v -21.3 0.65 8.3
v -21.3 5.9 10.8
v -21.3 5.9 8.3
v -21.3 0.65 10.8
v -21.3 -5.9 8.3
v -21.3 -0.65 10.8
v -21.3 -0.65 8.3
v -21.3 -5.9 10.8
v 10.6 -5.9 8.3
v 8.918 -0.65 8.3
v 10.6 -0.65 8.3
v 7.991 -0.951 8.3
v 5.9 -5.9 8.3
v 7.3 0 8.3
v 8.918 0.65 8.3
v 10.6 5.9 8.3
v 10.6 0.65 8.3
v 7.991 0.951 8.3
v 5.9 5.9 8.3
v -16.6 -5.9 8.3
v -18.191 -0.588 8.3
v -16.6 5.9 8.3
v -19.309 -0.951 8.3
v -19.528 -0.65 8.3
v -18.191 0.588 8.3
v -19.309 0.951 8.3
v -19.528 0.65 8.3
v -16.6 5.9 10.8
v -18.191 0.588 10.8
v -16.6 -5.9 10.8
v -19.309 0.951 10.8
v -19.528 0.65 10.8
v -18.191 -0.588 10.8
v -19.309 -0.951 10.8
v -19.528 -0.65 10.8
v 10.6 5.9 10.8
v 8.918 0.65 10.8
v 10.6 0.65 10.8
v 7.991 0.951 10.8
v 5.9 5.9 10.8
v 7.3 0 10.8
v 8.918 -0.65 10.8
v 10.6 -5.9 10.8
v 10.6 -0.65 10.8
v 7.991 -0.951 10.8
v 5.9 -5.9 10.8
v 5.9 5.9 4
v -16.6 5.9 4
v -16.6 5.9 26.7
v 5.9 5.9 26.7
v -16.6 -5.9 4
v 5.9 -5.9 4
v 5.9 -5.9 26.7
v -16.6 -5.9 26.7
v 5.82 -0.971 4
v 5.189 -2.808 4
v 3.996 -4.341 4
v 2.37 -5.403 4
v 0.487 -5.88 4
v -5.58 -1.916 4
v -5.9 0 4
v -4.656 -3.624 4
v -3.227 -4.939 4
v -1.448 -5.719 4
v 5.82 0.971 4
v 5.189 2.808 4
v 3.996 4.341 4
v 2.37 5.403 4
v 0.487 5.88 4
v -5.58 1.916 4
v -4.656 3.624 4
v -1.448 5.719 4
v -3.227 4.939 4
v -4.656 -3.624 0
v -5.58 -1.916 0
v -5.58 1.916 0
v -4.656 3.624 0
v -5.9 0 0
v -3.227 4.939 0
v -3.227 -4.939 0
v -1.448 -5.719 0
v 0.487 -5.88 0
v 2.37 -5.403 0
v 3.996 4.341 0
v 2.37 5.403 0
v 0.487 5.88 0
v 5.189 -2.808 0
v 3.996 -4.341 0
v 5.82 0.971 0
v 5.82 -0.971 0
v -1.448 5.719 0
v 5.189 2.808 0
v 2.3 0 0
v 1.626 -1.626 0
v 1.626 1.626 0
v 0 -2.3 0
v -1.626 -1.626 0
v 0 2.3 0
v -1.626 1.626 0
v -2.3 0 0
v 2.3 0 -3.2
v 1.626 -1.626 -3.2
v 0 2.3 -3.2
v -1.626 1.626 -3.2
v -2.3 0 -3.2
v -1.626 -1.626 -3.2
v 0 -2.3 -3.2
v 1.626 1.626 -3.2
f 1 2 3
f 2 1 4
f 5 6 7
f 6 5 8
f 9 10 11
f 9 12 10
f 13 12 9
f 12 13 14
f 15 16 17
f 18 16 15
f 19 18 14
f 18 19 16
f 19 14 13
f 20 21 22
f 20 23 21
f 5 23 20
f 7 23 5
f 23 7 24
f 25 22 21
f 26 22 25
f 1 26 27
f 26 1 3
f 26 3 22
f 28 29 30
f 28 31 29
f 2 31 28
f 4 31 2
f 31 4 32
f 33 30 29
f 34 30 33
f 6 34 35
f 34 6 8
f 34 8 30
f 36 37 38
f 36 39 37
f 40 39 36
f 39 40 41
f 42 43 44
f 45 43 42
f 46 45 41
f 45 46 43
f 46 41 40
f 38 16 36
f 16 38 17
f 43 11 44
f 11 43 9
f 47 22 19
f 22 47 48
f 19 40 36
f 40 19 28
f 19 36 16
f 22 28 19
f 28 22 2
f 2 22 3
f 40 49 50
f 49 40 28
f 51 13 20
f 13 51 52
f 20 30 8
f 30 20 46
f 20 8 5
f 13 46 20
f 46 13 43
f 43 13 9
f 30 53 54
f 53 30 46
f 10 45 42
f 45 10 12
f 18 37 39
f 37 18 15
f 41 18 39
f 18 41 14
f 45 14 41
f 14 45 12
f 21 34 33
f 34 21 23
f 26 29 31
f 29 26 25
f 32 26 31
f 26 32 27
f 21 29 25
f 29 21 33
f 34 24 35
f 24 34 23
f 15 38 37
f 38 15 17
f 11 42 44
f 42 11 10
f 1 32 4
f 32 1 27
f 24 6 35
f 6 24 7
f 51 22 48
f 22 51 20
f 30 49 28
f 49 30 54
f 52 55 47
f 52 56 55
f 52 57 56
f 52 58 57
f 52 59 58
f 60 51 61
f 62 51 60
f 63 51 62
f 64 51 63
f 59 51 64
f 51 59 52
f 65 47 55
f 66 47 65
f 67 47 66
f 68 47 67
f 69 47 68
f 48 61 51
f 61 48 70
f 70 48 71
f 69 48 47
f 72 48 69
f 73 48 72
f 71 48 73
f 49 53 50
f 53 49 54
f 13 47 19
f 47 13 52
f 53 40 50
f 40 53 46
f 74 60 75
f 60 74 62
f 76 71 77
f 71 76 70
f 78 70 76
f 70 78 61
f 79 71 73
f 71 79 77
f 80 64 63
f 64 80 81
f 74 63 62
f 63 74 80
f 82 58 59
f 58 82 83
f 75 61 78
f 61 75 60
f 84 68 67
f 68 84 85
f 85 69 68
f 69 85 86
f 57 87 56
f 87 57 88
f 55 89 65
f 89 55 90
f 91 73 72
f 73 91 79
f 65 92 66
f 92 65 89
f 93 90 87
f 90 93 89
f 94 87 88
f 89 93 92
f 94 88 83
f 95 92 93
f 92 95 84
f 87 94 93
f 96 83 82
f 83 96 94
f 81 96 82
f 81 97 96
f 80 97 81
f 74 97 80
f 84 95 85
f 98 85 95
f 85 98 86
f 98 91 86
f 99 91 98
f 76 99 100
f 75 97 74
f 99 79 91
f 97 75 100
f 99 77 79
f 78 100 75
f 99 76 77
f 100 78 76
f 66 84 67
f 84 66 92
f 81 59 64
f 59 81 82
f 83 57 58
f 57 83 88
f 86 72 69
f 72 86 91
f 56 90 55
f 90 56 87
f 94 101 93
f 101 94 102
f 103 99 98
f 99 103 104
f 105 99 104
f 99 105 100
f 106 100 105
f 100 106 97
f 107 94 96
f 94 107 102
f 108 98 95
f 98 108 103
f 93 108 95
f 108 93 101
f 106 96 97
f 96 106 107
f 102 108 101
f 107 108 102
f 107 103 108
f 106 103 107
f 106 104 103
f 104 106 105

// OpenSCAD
servo_sg90();

module servo_sg90()
{
    width = 22.5;
    length = 11.8;
    height = 22.7;
    
    mounting_width = width + (2 * 4.7);
    mounting_length = length;
    mounting_height = 2.5;
    mounting_width_offset = -4.7;
    mounting_height_offset = 18.4 - mounting_height;
    
    mounting_hole_diameter = 2;
    mounting_hole_width_offset = 2.3;
    mounting_hole_length_offset = 5.9;
    
    mounting_notch_width = mounting_hole_width_offset;
    mounting_notch_length = 1.3;
    mounting_notch_width_offset = mounting_notch_width / 2;
    
    mount_point_height = 4;
    mount_point_diameter = 11.8;
    mount_point_width_offset = 5.9;
    mount_point_length_offset = length / 2;
    mount_point_height_offset = height;
    
    gear_height = 3.2;
    gear_diameter = 4.6;
    gear_width_offset = mount_point_width_offset;
    gear_length_offset = mount_point_length_offset;
    gear_height_offset = mount_point_height_offset + mount_point_height;
    
    rotate([0, 180, 0])
    translate([-(gear_width_offset), -(gear_length_offset), -(height + mount_point_height)])
    union()
    {
        color("blue", 1.0)
        cube([width, length, height], false);
        
        color("blue", 1.0)
        translate([mounting_width_offset, 0, mounting_height_offset])
        difference()
        {
            cube([mounting_width, mounting_length, mounting_height], false);
            
            translate([mounting_hole_width_offset, mounting_hole_length_offset, 0])
            cylinder(height, d = mounting_hole_diameter);
            
            translate([mounting_width - mounting_hole_width_offset, mounting_hole_length_offset, 0])
            cylinder(height, d = mounting_hole_diameter);
            
            translate([mounting_notch_width_offset, mounting_hole_length_offset, 0])
            cube([mounting_notch_width, mounting_notch_length, height], true);

            translate([mounting_width - mounting_notch_width_offset, mounting_hole_length_offset, 0])
            cube([mounting_notch_width, mounting_notch_length, height], true);
        }
        
        color("blue", 1.0)
        translate([mount_point_width_offset, mount_point_length_offset, mount_point_height_offset])
        cylinder(mount_point_height, d = mount_point_diameter);
        
        color("white", 1.0)
        translate([gear_width_offset, gear_length_offset, gear_height_offset])
        cylinder(gear_height, d = gear_diameter);
    }
}
